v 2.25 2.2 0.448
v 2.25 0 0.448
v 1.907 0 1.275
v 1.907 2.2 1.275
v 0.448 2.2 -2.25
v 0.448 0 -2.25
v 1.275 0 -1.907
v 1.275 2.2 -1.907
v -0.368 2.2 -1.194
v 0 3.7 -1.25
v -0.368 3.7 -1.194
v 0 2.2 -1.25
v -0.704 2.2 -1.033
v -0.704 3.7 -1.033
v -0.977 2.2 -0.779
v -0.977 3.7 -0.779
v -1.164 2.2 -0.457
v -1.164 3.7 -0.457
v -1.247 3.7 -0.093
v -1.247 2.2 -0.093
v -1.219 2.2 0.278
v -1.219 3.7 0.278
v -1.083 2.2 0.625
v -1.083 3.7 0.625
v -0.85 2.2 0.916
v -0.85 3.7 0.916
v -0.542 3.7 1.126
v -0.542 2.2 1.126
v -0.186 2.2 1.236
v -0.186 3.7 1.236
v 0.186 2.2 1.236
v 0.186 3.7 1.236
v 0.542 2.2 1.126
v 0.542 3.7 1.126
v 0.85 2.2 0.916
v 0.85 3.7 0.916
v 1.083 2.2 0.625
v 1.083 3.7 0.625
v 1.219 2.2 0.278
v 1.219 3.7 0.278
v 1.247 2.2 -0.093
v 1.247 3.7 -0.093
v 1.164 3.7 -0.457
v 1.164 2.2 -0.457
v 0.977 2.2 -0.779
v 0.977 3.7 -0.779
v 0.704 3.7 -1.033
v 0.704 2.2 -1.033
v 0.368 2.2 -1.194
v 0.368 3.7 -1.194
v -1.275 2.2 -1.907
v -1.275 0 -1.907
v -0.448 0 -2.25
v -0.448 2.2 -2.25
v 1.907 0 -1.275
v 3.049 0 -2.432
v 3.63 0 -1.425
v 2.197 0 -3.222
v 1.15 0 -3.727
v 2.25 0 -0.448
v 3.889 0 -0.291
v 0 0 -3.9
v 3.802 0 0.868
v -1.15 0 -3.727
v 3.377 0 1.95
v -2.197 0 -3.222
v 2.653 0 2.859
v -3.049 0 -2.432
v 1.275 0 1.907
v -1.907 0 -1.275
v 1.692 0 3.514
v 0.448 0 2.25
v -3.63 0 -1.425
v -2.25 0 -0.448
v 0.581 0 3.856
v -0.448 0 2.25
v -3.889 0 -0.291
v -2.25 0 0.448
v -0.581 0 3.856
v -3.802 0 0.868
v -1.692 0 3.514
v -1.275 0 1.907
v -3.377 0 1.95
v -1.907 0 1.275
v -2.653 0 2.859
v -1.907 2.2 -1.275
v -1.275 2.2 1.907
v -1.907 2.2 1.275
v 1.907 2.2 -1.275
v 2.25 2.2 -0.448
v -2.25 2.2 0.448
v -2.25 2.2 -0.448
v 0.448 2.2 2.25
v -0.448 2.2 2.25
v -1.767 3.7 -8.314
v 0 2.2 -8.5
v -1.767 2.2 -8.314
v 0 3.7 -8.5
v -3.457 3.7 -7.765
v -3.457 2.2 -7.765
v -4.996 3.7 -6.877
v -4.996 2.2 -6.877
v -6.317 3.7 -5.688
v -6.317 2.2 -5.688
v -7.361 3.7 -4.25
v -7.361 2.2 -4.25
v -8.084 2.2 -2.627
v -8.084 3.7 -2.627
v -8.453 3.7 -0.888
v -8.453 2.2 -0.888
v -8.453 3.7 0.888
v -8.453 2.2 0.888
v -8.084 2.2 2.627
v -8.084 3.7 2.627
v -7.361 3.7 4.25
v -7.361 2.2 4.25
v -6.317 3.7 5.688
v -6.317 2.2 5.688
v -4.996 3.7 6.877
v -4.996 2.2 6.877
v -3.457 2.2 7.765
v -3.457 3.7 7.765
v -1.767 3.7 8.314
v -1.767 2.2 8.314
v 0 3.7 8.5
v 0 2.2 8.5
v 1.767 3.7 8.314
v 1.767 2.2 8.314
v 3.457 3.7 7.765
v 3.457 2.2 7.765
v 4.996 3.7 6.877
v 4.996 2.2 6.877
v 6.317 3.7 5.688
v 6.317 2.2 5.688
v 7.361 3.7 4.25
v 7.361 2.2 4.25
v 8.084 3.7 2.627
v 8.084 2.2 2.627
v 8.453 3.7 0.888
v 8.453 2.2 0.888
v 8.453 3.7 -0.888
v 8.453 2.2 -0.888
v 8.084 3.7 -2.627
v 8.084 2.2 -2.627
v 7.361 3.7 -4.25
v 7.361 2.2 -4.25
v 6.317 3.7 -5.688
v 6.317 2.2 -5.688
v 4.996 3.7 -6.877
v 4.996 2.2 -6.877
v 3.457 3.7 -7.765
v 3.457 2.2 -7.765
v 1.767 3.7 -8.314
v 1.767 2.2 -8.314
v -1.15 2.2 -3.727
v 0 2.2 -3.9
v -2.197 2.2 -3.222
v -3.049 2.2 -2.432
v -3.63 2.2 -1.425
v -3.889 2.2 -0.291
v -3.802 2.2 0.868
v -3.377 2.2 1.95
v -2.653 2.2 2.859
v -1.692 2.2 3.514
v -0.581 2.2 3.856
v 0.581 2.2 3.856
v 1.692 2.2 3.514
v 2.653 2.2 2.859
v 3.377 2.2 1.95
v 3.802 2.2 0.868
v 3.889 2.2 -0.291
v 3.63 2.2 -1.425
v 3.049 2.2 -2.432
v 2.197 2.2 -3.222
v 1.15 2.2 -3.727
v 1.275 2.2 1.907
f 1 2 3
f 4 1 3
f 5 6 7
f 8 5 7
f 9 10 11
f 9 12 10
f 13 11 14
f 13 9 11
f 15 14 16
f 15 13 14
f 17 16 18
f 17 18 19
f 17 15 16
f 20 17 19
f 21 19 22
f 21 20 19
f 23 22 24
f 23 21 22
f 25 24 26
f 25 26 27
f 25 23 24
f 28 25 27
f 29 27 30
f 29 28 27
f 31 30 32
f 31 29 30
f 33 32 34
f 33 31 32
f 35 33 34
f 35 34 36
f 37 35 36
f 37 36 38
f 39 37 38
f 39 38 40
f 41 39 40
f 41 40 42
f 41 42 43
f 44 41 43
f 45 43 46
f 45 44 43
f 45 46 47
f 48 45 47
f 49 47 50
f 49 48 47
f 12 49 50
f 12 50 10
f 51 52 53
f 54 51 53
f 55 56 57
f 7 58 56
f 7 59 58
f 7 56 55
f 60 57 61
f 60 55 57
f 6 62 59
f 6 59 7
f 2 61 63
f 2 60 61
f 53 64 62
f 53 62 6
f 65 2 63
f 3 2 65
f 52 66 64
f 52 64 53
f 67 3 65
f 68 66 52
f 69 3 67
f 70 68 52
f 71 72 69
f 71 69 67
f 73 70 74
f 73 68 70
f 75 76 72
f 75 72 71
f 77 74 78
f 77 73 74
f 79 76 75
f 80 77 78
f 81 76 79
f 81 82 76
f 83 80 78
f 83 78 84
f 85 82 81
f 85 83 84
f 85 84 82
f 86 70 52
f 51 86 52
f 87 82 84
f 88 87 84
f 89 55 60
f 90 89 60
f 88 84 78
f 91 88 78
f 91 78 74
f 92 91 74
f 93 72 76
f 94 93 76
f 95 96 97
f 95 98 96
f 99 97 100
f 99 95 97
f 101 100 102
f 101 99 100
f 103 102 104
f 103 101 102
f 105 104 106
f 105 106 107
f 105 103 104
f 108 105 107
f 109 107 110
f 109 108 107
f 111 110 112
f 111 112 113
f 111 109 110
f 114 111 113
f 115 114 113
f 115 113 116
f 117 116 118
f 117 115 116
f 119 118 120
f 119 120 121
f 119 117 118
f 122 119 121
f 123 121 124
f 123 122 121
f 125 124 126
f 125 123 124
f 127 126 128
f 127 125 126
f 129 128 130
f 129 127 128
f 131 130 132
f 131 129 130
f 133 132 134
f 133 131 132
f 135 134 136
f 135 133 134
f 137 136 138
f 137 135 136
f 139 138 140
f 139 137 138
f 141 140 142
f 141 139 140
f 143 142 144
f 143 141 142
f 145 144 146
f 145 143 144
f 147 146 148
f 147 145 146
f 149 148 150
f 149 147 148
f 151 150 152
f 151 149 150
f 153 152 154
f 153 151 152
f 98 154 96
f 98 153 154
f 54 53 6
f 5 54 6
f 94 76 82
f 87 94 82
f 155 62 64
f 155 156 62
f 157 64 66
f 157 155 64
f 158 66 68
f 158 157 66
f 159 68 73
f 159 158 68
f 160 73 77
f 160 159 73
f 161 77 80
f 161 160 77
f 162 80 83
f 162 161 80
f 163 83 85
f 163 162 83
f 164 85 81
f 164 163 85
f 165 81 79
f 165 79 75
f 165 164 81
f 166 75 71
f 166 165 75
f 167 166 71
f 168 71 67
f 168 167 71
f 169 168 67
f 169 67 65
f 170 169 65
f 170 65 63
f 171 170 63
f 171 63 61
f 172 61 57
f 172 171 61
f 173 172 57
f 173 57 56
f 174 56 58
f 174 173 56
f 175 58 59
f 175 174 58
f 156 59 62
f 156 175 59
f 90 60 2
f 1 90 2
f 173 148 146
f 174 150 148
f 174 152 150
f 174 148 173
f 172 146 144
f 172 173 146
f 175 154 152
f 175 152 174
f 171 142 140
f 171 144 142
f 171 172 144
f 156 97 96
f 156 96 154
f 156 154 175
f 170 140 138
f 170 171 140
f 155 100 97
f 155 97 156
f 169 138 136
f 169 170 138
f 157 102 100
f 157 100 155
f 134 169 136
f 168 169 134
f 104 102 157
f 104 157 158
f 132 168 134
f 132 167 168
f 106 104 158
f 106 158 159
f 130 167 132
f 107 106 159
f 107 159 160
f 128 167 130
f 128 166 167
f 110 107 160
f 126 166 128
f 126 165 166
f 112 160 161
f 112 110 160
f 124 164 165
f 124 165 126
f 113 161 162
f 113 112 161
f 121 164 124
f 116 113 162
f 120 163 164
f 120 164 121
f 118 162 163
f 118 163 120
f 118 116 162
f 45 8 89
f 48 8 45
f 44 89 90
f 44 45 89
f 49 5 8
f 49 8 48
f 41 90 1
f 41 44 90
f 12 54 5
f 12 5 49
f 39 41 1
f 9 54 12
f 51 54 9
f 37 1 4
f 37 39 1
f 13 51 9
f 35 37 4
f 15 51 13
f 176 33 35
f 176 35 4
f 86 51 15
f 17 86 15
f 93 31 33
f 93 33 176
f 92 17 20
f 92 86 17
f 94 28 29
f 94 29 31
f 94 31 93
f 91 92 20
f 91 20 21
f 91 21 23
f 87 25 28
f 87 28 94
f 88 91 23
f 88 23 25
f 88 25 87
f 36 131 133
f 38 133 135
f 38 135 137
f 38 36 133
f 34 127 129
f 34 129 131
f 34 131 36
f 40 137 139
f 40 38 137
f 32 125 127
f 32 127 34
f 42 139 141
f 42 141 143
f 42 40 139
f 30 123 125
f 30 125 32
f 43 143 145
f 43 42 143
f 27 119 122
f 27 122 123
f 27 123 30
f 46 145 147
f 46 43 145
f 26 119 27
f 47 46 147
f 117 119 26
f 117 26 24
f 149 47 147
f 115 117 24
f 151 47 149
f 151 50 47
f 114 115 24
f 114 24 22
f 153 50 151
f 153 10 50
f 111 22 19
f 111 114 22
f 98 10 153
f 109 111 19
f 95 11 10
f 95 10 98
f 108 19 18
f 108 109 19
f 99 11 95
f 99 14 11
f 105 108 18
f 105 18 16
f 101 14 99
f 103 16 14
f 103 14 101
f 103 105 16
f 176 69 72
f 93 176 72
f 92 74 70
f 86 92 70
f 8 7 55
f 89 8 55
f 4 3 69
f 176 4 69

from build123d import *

# Parameters (mm, degrees)
ENL_V_MAT_EXTRU_1_DEPTH = 2.2


with BuildPart() as part:
    # Esquisse1 → Révolution1 (revolve)
    with BuildSketch(Plane.XY, mode=Mode.PRIVATE) as r_volution1_sk:
        Polygon((-8.5, 3.7), (-1.25, 3.7), (-1.25, 2.2), (-2.2, 2.2), (-2.2, 0), (-3.9, 0), (-3.9, 2.2), (-8.5, 2.2), align=None)
    revolve(r_volution1_sk.sketch.rotate(Axis((0, 0, 0), (0, 1, 0)), 270), axis=Axis((0, 0, 0), (0, 1, 0)))

    # Esquisse2 → Enlèv. mat.-Extru.1 (cut)
    with BuildSketch(Plane.XZ):
        Polygon((1.274522619, -1.907457896), (1.907457896, -1.274522619), (2.25, -0.447552827), (2.25, 0.447552827), (1.907457896, 1.274522619), (1.274522619, 1.907457896), (0.447552827, 2.25), (-0.447552827, 2.25), (-1.274522619, 1.907457896), (-1.907457896, 1.274522619), (-2.25, 0.447552827), (-2.25, -0.447552827), (-1.907457896, -1.274522619), (-1.274522619, -1.907457896), (-0.447552827, -2.25), (0.447552827, -2.25), align=None)
    extrude(amount=-ENL_V_MAT_EXTRU_1_DEPTH, mode=Mode.SUBTRACT)


solid = part.part
